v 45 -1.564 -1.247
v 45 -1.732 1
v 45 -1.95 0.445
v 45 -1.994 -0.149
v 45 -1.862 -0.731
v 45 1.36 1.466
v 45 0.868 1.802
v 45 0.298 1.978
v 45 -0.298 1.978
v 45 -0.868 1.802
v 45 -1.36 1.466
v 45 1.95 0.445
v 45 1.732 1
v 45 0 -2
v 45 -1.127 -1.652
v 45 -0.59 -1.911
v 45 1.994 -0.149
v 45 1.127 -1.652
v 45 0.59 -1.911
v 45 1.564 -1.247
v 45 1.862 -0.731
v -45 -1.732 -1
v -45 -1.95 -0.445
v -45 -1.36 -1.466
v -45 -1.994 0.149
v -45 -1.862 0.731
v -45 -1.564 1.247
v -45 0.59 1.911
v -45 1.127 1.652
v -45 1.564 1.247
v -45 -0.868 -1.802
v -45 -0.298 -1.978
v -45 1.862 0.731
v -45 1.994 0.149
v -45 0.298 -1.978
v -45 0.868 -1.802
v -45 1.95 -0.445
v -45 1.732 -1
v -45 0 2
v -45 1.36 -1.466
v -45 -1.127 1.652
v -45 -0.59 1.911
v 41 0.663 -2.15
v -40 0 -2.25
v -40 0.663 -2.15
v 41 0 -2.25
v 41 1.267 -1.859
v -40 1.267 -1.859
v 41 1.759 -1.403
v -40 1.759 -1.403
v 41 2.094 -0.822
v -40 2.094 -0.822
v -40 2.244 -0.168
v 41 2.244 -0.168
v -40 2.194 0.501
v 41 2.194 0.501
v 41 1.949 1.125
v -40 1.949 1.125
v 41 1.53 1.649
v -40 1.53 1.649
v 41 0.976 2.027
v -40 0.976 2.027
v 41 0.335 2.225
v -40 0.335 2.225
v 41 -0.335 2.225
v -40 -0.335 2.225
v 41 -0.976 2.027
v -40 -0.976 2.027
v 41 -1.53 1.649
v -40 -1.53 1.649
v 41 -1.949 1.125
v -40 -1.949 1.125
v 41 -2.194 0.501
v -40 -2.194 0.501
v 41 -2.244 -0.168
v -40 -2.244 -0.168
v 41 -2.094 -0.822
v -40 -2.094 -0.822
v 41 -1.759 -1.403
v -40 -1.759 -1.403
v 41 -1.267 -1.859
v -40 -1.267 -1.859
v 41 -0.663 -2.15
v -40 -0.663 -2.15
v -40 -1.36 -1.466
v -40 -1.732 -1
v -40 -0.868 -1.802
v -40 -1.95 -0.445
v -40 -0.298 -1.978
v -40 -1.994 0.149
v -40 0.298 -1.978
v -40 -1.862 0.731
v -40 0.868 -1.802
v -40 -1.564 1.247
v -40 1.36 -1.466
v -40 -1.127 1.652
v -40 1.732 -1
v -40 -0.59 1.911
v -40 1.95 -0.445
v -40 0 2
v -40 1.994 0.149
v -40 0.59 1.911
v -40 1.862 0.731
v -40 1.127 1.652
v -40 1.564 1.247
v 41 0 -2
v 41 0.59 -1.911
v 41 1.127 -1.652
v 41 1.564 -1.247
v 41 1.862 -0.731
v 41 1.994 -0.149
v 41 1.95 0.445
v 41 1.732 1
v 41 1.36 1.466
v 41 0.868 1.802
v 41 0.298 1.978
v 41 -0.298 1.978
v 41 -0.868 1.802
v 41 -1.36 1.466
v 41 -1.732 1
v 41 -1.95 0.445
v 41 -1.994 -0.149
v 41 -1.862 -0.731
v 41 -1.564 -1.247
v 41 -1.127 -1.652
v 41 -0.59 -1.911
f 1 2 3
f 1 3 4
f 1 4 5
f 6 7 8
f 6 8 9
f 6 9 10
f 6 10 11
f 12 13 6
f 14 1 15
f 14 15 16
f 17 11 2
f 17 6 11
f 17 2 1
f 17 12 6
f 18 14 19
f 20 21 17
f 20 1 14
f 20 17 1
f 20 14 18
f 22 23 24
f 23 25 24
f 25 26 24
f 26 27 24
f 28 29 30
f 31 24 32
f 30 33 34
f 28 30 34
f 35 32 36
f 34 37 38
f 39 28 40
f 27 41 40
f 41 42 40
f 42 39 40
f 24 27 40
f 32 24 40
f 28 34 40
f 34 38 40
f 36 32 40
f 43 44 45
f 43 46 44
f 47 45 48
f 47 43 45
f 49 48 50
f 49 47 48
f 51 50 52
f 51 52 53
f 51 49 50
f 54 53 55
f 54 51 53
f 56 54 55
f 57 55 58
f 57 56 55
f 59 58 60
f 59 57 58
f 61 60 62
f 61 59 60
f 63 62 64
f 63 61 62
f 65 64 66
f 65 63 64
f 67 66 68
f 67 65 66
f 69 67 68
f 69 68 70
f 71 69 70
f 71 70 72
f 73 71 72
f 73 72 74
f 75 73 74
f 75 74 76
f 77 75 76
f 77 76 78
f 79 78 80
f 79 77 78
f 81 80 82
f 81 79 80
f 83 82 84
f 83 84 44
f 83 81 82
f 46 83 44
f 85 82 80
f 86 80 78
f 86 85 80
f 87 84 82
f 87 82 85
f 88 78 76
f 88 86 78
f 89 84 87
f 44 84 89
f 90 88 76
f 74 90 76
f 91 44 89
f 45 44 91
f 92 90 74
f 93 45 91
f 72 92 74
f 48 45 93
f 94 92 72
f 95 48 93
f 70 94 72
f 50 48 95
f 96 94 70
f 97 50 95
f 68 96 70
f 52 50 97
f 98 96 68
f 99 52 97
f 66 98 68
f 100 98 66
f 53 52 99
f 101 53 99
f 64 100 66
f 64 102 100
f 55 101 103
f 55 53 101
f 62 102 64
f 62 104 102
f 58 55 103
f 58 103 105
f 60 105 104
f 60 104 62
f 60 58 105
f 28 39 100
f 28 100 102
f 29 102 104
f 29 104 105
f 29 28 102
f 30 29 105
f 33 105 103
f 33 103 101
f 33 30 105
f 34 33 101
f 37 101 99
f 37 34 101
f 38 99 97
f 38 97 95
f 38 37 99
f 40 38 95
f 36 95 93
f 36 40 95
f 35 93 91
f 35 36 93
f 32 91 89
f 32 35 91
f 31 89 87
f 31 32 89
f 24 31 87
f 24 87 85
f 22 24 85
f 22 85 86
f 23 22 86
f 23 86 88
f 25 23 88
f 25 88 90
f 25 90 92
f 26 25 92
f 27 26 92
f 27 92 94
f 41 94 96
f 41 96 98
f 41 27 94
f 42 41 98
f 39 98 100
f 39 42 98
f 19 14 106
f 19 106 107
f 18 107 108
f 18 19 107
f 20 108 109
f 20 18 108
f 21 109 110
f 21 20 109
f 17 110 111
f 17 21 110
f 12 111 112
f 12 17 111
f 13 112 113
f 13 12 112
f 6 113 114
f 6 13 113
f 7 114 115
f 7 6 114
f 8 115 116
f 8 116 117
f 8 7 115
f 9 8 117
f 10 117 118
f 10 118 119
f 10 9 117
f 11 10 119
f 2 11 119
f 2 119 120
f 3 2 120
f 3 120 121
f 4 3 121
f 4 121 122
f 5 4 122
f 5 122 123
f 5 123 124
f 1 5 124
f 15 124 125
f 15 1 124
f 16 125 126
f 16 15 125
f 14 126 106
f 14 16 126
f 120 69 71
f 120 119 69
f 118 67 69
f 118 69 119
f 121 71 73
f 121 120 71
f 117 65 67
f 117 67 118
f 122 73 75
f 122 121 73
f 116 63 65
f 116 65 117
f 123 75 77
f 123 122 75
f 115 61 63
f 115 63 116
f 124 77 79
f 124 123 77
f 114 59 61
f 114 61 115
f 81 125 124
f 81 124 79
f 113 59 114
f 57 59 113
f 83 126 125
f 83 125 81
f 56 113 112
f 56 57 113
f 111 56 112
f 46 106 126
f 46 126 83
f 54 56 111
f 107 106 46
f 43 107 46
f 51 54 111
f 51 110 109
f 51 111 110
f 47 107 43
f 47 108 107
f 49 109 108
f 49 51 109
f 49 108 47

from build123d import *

# Parameters (mm, degrees)
SKETCH1_R           = 2.25
BOSS_EXTRUDE1_DEPTH = 45
SKETCH2_R           = 2.25
SKETCH2_R_2         = 2
CUT_EXTRUDE1_DEPTH  = 4
SKETCH3_R           = 2.25
SKETCH3_R_2         = 2
CUT_EXTRUDE2_DEPTH  = 5


with BuildPart() as part:
    # Sketch1 → Boss-Extrude1 (new body, symmetric)
    with BuildSketch(Plane(origin=(0, 0, 0), x_dir=(0, 0, -1), z_dir=(1, 0, 0))):
        Circle(SKETCH1_R)
    extrude(amount=BOSS_EXTRUDE1_DEPTH, both=True)

    # Sketch2 → Cut-Extrude1 (cut)
    with BuildSketch(Plane(origin=(45, 0, 0), x_dir=(0, 0, -1), z_dir=(1, 0, 0))):
        Circle(SKETCH2_R)
        Circle(SKETCH2_R_2, mode=Mode.SUBTRACT)
    extrude(amount=-CUT_EXTRUDE1_DEPTH, mode=Mode.SUBTRACT)

    # Sketch3 → Cut-Extrude2 (cut)
    with BuildSketch(Plane.ZY.offset(45)):
        Circle(SKETCH3_R)
        Circle(SKETCH3_R_2, mode=Mode.SUBTRACT)
    extrude(amount=-CUT_EXTRUDE2_DEPTH, mode=Mode.SUBTRACT)


solid = part.part
